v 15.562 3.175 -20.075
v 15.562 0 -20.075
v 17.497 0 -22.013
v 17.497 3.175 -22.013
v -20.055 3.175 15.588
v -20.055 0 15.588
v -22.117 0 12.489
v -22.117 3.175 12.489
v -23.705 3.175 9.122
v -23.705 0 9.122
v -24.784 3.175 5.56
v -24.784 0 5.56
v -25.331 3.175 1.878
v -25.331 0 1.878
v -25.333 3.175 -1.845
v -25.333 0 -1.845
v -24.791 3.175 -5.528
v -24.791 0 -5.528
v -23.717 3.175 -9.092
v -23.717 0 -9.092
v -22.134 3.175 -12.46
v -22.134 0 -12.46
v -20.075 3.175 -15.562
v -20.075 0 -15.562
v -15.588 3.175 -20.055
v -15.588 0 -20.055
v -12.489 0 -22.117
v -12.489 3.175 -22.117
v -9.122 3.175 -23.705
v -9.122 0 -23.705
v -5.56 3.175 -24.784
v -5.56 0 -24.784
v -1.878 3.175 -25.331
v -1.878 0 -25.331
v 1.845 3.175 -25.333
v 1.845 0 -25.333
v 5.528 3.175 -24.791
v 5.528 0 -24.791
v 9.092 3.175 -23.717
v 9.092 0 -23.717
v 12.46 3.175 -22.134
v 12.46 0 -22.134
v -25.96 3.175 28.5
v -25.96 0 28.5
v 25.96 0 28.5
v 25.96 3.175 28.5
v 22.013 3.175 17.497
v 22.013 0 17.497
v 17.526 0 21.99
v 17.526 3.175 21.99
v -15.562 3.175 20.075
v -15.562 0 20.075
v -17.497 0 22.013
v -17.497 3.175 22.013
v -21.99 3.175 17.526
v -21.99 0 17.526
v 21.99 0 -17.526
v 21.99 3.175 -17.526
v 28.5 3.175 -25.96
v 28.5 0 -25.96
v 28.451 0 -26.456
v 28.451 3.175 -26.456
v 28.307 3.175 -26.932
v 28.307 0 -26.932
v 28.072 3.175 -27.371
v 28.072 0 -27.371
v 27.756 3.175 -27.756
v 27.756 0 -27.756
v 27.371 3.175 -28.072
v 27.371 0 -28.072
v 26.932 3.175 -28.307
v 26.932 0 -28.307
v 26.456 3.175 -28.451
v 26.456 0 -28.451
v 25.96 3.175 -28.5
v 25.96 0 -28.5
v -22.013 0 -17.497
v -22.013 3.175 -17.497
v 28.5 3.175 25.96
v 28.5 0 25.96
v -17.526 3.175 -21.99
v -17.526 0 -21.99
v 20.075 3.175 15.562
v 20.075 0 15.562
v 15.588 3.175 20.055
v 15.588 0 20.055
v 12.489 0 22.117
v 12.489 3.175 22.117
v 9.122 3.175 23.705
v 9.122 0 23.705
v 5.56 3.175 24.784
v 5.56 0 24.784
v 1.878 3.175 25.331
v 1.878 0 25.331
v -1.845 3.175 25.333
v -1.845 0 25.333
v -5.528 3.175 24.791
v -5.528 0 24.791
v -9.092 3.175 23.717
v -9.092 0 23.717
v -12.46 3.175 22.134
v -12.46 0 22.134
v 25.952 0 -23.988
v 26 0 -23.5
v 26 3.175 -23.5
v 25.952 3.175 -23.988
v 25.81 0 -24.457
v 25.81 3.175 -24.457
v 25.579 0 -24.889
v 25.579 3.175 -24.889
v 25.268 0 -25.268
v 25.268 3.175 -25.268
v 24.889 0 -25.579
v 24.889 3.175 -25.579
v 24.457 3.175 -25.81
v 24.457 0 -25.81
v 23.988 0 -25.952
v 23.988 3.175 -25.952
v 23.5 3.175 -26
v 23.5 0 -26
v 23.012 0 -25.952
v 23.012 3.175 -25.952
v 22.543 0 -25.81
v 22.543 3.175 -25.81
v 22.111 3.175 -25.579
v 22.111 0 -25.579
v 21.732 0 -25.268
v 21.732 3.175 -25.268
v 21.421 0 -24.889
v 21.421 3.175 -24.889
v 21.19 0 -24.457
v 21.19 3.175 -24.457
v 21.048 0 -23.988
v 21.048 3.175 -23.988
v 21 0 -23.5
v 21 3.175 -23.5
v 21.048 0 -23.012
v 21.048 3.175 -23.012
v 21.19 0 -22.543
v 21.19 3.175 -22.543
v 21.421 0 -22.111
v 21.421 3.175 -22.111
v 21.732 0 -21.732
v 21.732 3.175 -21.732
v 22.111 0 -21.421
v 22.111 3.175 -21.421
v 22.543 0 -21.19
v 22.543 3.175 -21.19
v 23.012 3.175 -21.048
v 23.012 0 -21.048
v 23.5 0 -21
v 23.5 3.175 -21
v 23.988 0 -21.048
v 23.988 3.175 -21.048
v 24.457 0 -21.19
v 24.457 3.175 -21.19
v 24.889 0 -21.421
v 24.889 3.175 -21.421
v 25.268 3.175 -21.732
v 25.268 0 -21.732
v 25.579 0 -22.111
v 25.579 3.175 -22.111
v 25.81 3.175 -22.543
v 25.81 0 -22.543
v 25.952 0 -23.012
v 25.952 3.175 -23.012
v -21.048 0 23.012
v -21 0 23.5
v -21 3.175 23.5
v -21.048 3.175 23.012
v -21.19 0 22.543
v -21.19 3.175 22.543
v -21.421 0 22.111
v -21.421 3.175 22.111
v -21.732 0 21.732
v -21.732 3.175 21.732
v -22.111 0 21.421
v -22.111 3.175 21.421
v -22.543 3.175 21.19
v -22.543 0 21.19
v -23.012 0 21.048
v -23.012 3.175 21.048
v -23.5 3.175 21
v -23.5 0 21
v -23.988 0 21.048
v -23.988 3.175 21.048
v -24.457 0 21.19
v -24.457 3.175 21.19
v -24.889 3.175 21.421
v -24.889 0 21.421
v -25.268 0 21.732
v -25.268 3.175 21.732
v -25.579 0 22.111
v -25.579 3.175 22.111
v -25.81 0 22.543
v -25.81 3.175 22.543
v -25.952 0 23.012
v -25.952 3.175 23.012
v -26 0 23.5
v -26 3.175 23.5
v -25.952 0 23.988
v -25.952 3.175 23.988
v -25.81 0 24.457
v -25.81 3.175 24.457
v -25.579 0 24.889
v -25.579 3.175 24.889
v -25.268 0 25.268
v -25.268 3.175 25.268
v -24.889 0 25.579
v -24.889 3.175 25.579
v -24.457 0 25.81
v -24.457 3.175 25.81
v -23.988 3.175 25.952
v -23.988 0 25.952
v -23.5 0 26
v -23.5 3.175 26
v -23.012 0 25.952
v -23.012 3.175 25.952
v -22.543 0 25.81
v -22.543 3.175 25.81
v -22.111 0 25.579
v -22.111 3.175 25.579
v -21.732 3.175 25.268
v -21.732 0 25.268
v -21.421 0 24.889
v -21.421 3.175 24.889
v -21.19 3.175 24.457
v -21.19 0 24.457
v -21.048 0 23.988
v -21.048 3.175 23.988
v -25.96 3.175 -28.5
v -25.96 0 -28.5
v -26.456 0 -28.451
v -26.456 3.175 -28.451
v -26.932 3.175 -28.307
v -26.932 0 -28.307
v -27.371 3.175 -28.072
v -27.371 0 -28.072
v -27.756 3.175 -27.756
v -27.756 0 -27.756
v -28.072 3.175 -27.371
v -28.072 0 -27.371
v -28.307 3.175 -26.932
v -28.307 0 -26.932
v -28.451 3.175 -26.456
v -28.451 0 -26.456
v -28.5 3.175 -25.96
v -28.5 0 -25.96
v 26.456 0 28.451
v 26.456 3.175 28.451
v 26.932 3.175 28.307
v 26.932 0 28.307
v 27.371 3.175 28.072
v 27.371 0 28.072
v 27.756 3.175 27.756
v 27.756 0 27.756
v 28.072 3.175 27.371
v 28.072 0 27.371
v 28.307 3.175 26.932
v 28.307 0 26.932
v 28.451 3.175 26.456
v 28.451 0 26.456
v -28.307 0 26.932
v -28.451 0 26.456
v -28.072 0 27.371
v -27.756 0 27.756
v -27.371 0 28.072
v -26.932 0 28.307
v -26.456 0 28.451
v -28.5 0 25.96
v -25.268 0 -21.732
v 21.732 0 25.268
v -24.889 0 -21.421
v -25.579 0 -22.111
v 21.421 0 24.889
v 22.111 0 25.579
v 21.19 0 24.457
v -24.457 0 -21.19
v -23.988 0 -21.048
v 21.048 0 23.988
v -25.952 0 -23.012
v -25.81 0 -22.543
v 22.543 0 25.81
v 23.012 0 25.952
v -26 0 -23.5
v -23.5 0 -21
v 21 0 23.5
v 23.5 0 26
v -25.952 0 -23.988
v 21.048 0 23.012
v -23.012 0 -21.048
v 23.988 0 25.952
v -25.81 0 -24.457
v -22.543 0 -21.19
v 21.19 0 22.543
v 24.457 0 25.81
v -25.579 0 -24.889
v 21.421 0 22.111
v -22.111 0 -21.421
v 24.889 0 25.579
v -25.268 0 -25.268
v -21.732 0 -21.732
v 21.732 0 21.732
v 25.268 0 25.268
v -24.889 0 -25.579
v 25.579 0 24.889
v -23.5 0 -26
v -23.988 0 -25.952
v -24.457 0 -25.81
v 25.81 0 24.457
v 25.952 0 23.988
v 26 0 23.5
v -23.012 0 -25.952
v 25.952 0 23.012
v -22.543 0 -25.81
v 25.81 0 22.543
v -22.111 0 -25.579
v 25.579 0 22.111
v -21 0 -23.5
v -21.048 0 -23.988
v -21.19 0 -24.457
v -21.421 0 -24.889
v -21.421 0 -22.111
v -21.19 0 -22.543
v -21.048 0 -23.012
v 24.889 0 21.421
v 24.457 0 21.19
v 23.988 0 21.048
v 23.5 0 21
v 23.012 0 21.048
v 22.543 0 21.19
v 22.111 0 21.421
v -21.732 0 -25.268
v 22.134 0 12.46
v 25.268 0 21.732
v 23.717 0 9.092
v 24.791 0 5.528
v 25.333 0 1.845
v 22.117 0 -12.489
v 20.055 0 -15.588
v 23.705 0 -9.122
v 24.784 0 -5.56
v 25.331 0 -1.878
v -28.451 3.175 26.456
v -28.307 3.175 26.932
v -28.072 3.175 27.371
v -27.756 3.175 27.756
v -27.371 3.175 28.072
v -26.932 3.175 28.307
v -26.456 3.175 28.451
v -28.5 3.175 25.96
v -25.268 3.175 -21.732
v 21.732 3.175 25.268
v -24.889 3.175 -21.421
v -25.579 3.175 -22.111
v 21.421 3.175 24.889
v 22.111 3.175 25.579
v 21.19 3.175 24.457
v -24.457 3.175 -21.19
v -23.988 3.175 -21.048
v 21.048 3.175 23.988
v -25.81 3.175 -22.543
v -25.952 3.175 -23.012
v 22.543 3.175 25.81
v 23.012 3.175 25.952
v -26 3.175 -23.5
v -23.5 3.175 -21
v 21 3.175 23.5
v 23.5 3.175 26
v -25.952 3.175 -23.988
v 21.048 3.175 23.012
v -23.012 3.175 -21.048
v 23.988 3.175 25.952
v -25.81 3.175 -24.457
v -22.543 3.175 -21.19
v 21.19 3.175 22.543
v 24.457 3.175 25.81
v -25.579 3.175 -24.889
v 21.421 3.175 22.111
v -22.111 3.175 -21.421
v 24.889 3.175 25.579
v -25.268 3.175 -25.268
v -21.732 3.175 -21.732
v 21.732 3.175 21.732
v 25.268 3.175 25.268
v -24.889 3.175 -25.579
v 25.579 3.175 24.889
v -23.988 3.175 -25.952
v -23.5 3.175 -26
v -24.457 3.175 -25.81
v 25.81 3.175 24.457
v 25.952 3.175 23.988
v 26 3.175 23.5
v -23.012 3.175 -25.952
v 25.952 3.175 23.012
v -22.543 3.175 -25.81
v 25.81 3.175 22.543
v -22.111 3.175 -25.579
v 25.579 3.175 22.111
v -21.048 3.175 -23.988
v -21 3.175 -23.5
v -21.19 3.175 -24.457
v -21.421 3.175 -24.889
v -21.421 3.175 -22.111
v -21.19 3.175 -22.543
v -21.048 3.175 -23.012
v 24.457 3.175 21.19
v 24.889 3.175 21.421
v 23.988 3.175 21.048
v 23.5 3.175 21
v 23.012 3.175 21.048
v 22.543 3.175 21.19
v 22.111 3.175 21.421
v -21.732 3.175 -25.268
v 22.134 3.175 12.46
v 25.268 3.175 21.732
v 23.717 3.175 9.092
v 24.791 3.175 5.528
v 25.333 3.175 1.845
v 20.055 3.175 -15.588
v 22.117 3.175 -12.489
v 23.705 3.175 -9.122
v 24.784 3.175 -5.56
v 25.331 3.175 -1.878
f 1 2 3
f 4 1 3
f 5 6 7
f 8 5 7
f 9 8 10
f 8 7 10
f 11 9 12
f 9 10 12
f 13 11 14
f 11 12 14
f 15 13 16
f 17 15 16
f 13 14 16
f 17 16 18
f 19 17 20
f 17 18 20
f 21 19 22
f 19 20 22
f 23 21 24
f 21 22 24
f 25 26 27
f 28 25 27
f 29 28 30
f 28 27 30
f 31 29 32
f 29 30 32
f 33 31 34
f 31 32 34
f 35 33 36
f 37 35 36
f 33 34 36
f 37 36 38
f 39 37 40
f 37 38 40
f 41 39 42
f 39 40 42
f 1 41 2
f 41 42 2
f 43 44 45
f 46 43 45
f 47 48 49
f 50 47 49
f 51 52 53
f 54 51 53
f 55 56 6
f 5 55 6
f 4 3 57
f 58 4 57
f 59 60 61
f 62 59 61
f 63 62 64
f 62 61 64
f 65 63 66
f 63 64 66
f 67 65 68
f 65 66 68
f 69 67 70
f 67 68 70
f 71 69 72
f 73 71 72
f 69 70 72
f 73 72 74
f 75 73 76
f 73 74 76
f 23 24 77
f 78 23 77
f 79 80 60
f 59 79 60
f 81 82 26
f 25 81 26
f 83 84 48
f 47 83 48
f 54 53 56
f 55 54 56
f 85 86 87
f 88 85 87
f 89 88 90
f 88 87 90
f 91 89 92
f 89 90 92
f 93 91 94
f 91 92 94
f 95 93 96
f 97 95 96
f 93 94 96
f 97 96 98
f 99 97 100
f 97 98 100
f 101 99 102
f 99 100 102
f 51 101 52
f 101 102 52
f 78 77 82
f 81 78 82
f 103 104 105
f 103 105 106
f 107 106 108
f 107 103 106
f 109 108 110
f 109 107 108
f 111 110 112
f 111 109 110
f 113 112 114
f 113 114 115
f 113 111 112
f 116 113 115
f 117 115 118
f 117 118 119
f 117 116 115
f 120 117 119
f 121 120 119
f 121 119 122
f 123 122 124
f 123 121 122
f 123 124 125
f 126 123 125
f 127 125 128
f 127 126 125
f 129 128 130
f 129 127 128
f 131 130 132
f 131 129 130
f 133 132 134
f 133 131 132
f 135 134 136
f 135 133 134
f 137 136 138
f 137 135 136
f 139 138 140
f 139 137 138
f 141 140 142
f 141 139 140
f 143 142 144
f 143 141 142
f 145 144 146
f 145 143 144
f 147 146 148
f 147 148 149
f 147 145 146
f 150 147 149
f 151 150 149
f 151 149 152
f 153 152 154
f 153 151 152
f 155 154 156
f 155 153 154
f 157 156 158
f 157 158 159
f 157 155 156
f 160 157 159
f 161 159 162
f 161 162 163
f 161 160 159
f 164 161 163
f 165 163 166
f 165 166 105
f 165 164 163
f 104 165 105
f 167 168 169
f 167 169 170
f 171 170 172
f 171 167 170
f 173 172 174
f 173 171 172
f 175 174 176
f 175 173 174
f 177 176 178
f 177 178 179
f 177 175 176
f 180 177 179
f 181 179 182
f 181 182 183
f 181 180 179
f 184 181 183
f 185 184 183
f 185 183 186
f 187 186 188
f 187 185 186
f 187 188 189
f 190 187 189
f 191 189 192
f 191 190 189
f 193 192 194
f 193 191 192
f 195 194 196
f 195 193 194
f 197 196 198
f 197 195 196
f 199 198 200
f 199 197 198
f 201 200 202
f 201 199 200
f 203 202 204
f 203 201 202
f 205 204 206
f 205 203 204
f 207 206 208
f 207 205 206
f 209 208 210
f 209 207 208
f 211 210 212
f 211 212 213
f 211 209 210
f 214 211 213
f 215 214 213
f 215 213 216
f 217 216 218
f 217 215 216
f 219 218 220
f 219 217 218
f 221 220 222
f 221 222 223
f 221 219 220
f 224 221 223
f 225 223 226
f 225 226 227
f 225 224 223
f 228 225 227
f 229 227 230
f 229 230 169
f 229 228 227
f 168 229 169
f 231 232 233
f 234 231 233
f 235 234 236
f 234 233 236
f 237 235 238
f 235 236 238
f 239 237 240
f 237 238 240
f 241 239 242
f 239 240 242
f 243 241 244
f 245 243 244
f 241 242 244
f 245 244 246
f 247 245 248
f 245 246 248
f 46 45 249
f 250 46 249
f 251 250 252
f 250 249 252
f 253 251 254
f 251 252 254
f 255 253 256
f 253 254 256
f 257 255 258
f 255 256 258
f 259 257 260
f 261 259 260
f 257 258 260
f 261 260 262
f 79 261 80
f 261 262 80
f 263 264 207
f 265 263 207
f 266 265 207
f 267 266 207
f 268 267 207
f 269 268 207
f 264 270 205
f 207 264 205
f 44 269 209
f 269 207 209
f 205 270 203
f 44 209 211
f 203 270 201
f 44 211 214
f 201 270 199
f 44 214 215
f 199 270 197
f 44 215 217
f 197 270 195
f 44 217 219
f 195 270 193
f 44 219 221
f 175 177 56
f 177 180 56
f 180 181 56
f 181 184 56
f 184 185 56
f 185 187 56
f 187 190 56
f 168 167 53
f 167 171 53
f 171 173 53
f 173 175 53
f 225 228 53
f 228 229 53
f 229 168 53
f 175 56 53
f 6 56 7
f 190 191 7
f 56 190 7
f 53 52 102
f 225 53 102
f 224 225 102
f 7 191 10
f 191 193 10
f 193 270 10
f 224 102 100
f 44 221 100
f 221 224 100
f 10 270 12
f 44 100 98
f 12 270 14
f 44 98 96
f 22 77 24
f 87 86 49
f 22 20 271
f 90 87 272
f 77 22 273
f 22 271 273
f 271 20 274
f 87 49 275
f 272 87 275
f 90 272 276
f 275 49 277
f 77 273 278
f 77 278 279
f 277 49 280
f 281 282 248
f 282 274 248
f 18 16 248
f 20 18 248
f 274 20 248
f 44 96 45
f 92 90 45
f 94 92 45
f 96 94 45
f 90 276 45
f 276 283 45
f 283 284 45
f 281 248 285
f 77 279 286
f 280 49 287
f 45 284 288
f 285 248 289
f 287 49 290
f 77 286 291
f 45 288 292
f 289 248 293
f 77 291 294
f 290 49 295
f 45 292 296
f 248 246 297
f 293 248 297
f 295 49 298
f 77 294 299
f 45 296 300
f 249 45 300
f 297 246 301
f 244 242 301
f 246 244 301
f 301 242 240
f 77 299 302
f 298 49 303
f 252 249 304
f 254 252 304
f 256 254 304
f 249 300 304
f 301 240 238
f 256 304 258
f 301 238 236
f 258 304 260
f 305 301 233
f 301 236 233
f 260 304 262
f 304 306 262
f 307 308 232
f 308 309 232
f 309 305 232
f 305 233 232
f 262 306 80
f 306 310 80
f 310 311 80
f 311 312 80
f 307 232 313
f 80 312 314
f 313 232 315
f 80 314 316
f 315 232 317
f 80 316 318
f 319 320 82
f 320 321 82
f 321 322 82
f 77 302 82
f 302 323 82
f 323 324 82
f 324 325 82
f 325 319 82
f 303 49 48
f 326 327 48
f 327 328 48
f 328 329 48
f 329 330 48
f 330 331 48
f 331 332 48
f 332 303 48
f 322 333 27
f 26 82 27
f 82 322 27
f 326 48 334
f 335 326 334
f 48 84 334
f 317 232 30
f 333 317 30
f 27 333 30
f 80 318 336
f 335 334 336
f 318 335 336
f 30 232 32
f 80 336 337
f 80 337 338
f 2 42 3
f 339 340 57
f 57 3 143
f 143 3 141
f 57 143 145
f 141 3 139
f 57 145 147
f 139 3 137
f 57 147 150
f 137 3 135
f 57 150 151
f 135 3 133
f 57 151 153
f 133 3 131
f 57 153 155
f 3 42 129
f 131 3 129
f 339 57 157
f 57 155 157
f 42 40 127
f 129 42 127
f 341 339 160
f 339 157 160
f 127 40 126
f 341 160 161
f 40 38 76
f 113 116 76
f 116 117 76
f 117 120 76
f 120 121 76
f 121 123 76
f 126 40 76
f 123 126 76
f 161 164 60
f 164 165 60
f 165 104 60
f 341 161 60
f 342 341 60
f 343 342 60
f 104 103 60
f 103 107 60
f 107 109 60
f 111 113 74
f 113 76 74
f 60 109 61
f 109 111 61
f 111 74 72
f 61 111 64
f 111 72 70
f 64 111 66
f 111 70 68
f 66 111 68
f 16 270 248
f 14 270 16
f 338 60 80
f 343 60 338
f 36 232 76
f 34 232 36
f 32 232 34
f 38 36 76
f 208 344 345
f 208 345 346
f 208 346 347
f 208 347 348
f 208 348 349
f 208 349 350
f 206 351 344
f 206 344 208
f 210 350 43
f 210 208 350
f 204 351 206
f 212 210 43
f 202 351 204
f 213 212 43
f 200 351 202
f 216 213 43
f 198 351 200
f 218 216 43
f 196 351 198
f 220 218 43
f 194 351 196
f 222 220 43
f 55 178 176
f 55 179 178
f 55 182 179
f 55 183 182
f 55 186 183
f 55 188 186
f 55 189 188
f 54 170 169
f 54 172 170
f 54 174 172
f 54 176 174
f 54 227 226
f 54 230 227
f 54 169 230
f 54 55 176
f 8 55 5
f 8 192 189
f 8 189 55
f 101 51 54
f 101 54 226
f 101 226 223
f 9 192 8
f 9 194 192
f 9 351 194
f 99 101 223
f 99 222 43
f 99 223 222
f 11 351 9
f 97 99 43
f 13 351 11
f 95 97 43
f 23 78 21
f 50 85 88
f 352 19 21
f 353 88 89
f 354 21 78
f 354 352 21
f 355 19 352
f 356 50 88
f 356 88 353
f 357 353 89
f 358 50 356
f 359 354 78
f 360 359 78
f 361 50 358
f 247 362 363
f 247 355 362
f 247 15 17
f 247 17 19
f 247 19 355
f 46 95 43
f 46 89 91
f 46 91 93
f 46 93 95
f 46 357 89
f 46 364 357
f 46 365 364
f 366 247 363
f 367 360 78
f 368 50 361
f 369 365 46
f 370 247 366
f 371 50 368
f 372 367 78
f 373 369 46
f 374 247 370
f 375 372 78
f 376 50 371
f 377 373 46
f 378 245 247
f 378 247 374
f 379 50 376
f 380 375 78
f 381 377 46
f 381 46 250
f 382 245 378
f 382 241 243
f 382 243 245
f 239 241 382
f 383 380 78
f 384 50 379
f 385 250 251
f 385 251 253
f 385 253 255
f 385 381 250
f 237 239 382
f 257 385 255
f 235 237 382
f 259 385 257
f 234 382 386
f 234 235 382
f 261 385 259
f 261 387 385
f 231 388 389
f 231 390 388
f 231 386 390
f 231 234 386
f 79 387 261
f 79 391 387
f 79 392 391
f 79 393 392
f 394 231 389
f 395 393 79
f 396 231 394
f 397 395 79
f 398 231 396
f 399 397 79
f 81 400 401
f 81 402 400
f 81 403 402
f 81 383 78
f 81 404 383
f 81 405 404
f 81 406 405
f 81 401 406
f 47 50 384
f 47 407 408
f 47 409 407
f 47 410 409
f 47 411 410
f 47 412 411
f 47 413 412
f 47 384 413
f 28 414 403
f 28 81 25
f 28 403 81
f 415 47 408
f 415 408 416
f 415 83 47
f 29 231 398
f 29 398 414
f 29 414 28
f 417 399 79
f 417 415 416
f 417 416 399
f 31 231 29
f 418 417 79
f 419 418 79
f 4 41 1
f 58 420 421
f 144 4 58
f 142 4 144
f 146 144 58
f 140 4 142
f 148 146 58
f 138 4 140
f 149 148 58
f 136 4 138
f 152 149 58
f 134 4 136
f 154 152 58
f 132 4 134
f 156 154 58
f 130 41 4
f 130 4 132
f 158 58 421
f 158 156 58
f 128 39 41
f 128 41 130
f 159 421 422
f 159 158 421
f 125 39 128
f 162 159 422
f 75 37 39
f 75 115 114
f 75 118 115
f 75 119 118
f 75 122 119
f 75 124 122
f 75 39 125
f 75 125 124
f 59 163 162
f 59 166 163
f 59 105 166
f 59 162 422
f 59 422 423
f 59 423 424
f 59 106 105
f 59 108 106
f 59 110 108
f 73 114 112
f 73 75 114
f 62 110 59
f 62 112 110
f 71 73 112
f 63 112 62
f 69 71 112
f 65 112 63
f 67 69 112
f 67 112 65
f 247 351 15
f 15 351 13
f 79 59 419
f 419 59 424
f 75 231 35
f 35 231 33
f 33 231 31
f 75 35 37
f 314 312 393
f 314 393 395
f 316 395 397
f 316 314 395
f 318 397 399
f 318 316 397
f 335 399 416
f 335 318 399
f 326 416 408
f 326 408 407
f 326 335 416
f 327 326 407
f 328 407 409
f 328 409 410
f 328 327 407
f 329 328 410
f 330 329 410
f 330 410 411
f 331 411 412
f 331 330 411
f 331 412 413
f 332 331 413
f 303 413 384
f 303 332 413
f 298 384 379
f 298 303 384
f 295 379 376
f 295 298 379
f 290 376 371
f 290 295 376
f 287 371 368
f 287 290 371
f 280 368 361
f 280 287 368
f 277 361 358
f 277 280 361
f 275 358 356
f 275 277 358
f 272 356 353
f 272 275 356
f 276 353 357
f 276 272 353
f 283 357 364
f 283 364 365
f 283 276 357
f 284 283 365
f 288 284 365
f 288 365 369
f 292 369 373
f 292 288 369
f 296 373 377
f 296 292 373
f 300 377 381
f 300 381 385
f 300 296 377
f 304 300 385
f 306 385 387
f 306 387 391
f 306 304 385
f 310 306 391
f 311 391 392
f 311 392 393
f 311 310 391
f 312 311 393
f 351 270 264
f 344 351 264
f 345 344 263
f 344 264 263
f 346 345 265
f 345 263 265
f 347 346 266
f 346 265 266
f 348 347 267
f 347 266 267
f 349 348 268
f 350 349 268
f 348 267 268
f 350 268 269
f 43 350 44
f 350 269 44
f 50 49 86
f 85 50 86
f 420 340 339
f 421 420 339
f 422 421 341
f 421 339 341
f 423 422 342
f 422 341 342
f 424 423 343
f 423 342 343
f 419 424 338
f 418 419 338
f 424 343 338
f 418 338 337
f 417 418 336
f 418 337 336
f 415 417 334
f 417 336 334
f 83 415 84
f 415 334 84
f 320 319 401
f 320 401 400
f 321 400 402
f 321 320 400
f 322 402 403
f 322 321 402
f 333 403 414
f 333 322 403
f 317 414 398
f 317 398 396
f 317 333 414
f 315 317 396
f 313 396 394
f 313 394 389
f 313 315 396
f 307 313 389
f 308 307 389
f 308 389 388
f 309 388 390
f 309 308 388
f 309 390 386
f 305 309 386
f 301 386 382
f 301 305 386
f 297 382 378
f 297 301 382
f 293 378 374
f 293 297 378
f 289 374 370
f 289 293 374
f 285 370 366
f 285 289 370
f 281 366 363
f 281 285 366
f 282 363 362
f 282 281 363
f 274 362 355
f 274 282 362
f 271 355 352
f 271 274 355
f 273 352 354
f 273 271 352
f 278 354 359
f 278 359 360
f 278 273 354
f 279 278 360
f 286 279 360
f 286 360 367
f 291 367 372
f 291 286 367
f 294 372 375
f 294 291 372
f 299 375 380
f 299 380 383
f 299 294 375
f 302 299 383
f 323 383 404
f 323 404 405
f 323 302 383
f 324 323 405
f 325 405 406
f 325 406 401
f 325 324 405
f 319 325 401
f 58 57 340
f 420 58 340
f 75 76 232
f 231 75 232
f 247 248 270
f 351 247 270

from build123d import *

# Parameters (mm, degrees)
SKETCH1_R           = 2.499995
BOSS_EXTRUDE1_DEPTH = 3.175


with BuildPart() as part:
    # Sketch1 → Boss-Extrude1 (new body)
    with BuildSketch(Plane(origin=(0, 0, 0), x_dir=(1, 0, 0), z_dir=(0, 1, 0))):
        with BuildLine():
            Line((-13.993314597, 28.4999938), (-25.9599938, 28.4999938))
            ThreePointArc((-25.9599938, 28.4999938), (-27.756045024, 27.756045024), (-28.4999938, 25.9599938))
            Line((-28.4999938, 25.9599938), (-28.4999938, 13.993314597))
            Line((-28.4999938, 13.993314597), (-28.4999938, -13.993314597))
            Line((-28.4999938, -13.993314597), (-28.4999938, -25.9599938))
            ThreePointArc((-28.4999938, -25.9599938), (-27.756045024, -27.756045024), (-25.9599938, -28.4999938))
            Line((-25.9599938, -28.4999938), (-13.993314597, -28.4999938))
            Line((-13.993314597, -28.4999938), (13.993314597, -28.4999938))
            Line((13.993314597, -28.4999938), (25.9599938, -28.4999938))
            ThreePointArc((25.9599938, -28.4999938), (27.756045024, -27.756045024), (28.4999938, -25.9599938))
            Line((28.4999938, -25.9599938), (28.4999938, -13.993314597))
            Line((28.4999938, -13.993314597), (28.4999938, 13.993314597))
            Line((28.4999938, 13.993314597), (28.4999938, 25.9599938))
            ThreePointArc((28.4999938, 25.9599938), (27.756045024, 27.756045024), (25.9599938, 28.4999938))
            Line((25.9599938, 28.4999938), (13.993314597, 28.4999938))
            Line((13.993314597, 28.4999938), (-13.993314597, 28.4999938))
        make_face()
        with Locations((-23.5000038, 23.5000038)):
            Circle(SKETCH1_R, mode=Mode.SUBTRACT)
        with Locations((23.5000038, 23.5000038)):
            Circle(SKETCH1_R, mode=Mode.SUBTRACT)
        with Locations((23.5000038, -23.5000038)):
            Circle(SKETCH1_R, mode=Mode.SUBTRACT)
        with Locations((-23.5000038, -23.5000038)):
            Circle(SKETCH1_R, mode=Mode.SUBTRACT)
        with BuildLine():
            Line((17.525786369, -21.990248683), (15.587608536, -20.05458701))
            ThreePointArc((15.587608536, -20.05458701), (0.016497958, -25.399994642), (-15.561543442, -20.074819195))
            Line((-15.561543442, -20.074819195), (-17.497205115, -22.012997028))
            Line((-17.497205115, -22.012997028), (-21.990248683, -17.525786369))
            Line((-21.990248683, -17.525786369), (-20.05458701, -15.587608536))
            ThreePointArc((-20.05458701, -15.587608536), (-25.399994642, -0.016497958), (-20.074819195, 15.561543442))
            Line((-20.074819195, 15.561543442), (-22.012997028, 17.497205115))
            Line((-22.012997028, 17.497205115), (-17.525786369, 21.990248683))
            Line((-17.525786369, 21.990248683), (-15.587608536, 20.05458701))
            ThreePointArc((-15.587608536, 20.05458701), (-0.016497958, 25.399994642), (15.561543442, 20.074819195))
            Line((15.561543442, 20.074819195), (17.497205115, 22.012997028))
            Line((17.497205115, 22.012997028), (21.990248683, 17.525786369))
            Line((21.990248683, 17.525786369), (20.05458701, 15.587608536))
            ThreePointArc((20.05458701, 15.587608536), (25.399994642, 0.016497958), (20.074819195, -15.561543442))
            Line((20.074819195, -15.561543442), (22.012997028, -17.497205115))
            Line((22.012997028, -17.497205115), (17.525786369, -21.990248683))
        make_face(mode=Mode.SUBTRACT)
    extrude(amount=BOSS_EXTRUDE1_DEPTH)


solid = part.part
